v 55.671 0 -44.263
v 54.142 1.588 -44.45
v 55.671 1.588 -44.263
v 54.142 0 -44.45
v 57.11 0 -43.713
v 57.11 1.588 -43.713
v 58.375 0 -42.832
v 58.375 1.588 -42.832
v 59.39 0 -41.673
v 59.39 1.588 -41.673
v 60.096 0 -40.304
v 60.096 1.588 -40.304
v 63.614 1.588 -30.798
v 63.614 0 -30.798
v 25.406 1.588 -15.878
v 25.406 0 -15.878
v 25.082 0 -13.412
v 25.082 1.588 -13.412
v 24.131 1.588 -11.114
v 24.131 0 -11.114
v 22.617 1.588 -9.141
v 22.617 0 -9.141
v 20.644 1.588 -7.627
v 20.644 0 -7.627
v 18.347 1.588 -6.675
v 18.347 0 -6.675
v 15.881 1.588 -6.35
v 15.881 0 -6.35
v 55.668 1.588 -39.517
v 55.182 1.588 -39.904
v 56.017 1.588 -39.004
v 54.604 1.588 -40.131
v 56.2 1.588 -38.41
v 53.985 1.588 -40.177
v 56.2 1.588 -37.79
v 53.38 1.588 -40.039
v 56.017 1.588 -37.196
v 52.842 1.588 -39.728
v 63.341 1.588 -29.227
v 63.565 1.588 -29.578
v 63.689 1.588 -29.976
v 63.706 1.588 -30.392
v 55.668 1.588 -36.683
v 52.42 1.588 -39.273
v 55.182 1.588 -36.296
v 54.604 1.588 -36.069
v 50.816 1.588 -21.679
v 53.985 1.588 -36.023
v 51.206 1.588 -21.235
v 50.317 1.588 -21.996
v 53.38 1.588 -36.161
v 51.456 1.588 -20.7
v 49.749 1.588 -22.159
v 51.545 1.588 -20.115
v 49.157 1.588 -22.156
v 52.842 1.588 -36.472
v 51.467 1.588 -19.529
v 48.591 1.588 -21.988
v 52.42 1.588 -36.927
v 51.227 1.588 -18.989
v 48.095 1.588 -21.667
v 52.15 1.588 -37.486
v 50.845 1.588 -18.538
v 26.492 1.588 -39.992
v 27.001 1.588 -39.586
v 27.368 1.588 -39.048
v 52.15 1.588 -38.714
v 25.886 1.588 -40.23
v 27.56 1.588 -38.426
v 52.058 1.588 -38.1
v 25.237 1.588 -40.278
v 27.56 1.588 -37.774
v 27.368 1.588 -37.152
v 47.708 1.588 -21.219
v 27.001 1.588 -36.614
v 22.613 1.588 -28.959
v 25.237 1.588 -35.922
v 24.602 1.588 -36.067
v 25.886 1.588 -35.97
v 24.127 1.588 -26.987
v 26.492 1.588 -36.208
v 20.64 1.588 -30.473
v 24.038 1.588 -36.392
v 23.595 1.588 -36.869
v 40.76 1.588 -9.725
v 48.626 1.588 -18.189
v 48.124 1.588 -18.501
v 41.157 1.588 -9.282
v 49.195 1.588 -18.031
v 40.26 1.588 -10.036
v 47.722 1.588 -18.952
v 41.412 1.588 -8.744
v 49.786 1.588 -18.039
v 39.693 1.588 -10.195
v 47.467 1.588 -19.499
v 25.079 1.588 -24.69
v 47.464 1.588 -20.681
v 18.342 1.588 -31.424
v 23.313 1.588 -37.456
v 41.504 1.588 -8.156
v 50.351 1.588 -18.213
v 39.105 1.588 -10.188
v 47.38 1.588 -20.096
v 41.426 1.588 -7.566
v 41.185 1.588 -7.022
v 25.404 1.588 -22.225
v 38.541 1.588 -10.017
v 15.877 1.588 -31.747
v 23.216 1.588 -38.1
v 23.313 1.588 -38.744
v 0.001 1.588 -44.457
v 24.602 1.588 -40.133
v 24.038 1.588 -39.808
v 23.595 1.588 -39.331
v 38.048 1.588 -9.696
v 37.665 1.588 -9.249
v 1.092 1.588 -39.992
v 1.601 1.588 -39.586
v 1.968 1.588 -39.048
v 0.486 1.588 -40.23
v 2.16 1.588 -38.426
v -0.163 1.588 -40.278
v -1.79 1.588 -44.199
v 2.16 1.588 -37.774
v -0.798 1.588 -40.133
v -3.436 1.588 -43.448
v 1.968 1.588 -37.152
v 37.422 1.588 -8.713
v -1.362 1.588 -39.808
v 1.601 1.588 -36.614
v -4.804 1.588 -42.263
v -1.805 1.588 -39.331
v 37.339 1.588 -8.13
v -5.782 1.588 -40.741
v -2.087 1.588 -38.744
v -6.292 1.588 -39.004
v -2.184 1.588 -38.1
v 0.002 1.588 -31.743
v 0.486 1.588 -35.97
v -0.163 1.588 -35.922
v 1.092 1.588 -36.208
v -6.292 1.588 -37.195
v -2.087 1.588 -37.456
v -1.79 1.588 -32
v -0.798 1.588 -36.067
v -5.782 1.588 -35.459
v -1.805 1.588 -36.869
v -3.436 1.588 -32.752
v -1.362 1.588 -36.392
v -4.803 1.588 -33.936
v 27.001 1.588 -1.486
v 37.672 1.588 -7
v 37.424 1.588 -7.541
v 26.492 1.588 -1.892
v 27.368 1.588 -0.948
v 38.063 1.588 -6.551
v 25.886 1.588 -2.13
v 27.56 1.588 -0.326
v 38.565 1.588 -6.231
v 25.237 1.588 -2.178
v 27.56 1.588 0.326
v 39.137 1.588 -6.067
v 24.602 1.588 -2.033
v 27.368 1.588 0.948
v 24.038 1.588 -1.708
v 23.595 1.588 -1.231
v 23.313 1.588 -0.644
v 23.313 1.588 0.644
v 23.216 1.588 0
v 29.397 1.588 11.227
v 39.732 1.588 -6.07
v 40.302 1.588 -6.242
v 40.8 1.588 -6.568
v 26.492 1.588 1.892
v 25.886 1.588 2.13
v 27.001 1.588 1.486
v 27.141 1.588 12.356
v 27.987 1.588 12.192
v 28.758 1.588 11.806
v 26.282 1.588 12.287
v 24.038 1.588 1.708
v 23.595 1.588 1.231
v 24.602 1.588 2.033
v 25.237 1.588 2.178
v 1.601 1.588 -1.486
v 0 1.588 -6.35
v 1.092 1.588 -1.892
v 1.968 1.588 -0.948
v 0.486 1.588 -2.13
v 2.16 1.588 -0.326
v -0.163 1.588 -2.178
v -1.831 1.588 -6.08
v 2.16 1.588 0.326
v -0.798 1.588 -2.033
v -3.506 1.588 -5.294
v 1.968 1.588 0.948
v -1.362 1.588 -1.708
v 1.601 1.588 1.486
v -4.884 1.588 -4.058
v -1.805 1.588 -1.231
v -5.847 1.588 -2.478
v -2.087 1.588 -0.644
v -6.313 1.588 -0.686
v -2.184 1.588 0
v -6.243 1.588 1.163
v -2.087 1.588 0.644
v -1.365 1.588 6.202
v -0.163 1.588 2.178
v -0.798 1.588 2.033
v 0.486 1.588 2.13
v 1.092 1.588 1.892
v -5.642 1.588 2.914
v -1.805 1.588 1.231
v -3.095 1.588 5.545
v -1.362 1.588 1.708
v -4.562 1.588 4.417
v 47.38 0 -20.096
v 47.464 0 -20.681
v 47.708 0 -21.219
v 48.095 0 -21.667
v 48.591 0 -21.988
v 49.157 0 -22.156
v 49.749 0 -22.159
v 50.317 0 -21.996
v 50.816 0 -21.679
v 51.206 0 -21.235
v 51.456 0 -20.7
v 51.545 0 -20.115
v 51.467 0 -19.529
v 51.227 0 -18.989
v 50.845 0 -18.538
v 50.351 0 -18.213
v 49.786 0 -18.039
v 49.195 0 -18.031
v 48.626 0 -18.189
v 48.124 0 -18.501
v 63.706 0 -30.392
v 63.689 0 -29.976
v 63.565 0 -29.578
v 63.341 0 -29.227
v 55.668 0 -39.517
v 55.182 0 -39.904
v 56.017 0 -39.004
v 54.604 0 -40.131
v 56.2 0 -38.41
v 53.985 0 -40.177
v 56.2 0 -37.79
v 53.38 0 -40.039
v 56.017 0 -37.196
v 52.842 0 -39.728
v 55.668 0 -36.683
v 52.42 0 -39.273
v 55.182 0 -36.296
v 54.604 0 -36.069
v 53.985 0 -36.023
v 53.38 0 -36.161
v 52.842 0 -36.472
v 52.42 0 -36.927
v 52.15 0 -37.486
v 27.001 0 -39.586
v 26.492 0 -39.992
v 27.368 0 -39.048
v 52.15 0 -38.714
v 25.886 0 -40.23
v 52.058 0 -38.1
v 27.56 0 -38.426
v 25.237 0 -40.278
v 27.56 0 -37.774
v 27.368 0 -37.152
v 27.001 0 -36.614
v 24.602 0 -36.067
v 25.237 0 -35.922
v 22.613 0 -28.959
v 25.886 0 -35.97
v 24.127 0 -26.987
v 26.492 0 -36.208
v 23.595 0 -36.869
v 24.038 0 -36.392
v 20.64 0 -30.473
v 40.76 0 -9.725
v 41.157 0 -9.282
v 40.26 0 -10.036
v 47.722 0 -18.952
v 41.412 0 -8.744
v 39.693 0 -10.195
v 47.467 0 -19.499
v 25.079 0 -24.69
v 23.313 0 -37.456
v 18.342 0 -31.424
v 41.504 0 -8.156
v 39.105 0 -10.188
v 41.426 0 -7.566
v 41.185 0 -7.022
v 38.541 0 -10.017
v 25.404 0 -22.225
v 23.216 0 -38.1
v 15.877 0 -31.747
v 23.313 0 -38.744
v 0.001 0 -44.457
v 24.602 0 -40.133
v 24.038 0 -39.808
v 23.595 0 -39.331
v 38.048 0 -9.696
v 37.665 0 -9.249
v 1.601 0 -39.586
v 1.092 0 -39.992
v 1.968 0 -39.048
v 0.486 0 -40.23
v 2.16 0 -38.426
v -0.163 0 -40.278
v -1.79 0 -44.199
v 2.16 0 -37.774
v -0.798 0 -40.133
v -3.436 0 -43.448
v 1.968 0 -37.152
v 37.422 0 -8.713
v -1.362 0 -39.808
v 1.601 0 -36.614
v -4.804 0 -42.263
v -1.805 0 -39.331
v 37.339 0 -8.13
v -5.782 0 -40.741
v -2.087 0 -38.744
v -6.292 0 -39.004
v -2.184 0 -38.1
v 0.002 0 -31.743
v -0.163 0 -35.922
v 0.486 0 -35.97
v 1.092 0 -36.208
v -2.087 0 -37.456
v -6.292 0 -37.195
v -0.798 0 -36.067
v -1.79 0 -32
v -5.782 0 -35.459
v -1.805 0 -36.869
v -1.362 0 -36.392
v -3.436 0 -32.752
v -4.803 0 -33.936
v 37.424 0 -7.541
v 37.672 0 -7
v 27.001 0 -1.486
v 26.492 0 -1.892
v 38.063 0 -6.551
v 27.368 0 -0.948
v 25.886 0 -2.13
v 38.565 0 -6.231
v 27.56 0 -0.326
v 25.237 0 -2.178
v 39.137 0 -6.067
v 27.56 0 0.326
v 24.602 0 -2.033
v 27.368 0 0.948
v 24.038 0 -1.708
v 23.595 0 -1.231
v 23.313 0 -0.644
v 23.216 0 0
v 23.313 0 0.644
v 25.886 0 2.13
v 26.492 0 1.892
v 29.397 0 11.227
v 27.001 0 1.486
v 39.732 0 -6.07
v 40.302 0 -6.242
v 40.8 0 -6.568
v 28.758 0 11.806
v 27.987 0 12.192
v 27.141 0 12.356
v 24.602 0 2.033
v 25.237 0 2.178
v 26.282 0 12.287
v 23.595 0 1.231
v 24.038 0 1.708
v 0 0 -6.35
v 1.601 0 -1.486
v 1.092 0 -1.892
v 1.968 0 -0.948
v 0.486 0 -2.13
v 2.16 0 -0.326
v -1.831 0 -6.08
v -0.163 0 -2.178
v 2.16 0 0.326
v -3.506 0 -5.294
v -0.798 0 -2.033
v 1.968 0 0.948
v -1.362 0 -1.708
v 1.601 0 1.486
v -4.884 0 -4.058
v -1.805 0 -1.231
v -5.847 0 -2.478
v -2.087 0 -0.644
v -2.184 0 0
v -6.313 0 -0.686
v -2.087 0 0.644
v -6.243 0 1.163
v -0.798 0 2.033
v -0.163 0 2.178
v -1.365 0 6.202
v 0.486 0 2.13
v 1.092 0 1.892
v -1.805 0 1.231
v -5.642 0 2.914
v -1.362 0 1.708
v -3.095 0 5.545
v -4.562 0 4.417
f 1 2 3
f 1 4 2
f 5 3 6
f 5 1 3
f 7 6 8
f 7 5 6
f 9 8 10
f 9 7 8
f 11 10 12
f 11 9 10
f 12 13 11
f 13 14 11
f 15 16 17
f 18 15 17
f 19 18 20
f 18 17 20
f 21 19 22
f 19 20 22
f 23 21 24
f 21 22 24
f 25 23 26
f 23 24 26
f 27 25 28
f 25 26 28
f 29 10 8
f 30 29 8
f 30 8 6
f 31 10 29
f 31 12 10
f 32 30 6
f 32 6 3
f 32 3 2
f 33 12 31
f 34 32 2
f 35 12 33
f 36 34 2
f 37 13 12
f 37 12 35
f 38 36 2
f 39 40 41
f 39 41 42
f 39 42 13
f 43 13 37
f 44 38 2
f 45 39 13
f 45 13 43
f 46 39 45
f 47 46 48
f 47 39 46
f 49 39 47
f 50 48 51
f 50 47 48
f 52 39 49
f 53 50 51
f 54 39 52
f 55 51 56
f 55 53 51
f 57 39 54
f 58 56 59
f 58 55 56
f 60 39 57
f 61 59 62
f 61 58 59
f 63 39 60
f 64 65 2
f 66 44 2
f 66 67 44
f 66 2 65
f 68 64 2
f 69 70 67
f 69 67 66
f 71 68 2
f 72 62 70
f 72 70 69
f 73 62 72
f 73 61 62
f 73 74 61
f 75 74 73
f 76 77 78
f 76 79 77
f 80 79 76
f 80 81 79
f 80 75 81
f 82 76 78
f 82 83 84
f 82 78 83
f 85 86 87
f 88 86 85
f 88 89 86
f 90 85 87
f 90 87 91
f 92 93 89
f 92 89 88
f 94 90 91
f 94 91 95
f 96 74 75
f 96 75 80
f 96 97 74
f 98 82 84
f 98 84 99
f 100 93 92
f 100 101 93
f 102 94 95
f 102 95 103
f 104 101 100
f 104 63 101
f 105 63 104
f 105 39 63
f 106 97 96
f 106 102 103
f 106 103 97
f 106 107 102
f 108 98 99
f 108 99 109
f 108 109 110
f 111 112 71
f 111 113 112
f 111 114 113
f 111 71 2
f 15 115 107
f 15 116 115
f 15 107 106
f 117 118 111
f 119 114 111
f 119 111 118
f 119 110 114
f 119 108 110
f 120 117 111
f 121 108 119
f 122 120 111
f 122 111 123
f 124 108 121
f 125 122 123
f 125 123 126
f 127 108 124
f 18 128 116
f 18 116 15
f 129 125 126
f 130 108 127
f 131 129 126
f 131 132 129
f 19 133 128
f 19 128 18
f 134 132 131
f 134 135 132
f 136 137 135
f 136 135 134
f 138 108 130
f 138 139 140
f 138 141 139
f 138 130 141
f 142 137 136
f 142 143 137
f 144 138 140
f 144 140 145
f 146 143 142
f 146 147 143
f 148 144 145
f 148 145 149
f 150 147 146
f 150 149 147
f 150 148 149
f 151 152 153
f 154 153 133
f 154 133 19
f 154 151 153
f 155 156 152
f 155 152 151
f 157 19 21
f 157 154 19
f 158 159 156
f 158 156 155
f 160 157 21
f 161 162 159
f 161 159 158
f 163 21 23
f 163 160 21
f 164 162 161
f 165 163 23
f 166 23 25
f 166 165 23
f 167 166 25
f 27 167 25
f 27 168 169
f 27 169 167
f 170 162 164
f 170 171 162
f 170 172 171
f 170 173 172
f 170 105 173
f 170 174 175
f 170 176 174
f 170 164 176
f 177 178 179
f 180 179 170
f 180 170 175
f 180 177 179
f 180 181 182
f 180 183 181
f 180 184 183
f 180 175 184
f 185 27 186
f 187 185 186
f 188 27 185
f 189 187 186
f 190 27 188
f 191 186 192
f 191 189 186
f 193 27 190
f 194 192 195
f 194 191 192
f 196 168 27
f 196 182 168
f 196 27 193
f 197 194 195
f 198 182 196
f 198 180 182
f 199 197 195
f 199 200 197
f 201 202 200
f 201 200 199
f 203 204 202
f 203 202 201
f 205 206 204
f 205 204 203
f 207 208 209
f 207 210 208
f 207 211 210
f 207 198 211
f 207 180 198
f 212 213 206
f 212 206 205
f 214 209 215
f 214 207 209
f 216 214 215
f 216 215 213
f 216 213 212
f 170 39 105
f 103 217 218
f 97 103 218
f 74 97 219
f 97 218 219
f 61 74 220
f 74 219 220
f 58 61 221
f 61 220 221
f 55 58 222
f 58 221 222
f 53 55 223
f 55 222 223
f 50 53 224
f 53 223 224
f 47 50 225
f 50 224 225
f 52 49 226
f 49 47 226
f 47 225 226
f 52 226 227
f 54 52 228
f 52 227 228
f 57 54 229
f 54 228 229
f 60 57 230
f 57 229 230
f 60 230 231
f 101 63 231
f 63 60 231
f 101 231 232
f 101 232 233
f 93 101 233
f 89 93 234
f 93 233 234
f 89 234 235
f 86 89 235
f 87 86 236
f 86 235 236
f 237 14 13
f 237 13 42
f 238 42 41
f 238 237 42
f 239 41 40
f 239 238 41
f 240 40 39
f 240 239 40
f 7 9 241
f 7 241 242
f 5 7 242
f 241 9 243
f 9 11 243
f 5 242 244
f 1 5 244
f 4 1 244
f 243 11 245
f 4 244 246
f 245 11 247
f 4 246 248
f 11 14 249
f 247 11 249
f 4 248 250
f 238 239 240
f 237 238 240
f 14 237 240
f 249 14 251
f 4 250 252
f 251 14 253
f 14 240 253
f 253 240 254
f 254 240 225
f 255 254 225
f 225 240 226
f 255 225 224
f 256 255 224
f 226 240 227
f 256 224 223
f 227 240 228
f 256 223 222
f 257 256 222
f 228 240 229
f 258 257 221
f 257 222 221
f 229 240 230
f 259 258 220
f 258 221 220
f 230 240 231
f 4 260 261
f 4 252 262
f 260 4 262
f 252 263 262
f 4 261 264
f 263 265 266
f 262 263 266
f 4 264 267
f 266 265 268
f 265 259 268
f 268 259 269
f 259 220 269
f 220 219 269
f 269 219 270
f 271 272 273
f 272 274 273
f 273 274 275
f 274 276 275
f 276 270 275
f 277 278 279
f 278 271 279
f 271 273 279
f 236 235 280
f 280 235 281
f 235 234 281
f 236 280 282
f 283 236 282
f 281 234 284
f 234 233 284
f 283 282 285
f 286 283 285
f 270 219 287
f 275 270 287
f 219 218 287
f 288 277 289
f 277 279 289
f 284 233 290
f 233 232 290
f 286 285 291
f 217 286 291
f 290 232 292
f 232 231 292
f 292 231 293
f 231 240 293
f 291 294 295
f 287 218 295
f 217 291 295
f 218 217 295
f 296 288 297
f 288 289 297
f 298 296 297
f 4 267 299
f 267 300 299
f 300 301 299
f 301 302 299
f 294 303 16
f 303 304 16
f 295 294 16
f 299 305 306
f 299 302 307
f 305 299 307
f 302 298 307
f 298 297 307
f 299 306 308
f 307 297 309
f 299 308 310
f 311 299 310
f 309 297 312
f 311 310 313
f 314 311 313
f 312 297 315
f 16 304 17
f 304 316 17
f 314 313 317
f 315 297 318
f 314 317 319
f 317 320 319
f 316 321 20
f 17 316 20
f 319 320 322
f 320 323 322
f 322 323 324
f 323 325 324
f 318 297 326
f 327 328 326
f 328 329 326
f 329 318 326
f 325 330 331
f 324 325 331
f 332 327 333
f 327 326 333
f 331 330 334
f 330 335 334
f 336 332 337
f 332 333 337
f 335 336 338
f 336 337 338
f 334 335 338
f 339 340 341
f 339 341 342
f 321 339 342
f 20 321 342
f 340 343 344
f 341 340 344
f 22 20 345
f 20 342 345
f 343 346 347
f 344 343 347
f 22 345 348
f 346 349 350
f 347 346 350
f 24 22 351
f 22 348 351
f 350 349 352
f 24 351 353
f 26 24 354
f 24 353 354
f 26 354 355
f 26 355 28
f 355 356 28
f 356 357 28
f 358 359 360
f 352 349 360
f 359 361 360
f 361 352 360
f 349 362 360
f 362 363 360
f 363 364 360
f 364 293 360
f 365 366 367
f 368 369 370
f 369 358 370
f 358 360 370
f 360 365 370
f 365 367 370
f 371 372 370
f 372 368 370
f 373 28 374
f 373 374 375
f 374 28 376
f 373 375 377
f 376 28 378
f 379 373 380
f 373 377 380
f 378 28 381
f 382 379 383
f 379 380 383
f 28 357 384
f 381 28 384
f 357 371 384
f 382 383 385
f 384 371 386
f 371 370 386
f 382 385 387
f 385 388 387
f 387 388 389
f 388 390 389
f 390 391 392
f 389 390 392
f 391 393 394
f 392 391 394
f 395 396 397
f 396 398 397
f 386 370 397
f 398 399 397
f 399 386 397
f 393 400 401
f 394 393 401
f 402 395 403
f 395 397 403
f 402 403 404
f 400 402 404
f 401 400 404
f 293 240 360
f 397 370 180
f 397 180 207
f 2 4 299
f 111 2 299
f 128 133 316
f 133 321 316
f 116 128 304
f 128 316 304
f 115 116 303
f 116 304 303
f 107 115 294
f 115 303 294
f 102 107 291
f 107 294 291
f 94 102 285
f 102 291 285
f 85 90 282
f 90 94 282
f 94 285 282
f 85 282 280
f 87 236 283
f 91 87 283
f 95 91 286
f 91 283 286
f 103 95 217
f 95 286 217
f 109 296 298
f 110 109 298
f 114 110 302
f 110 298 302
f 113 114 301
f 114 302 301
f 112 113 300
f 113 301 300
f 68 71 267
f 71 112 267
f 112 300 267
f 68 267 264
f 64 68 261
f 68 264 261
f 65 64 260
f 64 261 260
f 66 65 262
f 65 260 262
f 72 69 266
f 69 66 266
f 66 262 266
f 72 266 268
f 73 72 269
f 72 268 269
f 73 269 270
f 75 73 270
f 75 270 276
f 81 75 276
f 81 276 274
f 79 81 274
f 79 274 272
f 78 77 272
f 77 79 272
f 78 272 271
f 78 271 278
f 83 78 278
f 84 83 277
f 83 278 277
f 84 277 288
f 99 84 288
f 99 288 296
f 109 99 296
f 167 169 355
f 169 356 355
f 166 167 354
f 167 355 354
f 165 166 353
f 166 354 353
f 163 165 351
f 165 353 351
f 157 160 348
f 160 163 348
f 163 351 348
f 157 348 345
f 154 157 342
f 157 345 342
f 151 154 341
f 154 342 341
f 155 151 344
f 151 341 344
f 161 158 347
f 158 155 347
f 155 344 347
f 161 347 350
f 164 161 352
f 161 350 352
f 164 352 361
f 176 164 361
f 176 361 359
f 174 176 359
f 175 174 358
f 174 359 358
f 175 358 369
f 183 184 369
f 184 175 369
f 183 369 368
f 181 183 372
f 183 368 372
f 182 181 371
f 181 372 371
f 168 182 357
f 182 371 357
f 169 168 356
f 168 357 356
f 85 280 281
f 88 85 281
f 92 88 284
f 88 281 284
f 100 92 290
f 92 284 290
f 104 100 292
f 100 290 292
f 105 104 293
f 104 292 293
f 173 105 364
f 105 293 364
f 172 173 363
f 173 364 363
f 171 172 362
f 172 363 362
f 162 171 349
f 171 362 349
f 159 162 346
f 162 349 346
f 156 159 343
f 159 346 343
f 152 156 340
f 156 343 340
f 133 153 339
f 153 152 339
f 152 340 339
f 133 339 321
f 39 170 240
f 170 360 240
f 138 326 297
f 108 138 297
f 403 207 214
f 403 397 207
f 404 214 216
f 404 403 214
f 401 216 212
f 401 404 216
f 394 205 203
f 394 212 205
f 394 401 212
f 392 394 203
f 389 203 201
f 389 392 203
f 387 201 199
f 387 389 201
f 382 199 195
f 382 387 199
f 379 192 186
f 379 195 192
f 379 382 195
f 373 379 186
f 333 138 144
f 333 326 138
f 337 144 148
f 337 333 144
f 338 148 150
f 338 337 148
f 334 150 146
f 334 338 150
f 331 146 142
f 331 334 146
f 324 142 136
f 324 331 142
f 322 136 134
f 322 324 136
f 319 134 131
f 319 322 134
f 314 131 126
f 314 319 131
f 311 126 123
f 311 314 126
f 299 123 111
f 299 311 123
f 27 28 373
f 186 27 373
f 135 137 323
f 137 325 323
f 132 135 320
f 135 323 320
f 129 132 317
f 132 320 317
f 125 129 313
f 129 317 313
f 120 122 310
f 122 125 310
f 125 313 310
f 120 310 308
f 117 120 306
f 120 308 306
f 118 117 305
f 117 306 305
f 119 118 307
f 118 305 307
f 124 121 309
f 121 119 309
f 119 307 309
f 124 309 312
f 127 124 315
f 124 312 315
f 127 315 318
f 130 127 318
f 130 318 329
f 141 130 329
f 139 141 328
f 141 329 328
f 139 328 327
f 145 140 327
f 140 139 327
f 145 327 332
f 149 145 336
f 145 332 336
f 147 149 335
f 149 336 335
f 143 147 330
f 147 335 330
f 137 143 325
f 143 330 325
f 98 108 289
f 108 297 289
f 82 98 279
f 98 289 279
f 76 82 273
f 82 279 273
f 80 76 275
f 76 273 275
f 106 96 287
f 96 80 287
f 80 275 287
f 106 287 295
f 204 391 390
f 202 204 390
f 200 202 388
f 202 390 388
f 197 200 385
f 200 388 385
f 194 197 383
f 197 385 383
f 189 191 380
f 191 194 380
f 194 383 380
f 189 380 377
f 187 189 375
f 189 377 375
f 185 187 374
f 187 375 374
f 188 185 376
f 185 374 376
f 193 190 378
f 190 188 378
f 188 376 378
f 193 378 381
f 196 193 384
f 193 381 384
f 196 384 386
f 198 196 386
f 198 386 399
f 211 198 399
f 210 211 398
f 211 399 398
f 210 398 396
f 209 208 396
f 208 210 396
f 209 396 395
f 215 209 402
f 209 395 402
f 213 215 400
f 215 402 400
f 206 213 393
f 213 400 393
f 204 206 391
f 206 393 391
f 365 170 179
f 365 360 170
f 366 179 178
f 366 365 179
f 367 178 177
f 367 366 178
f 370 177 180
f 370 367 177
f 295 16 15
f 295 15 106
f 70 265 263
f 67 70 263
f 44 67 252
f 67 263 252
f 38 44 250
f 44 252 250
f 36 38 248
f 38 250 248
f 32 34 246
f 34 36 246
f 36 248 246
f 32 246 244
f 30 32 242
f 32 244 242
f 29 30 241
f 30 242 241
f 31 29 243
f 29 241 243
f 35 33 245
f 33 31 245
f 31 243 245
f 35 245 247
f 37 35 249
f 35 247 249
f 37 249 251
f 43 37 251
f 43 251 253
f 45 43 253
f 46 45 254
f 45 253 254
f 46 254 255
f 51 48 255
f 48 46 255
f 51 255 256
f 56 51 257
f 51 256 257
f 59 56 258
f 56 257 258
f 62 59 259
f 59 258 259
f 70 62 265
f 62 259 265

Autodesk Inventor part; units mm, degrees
ref_plane "YZ Plane" through (0, 0, 0) normal (1, 0, 0) x (0, 1, 0)
ref_plane "XZ Plane" through (0, 0, 0) normal (0, 1, 0) x (-1, 0, 0)
ref_plane "XY Plane" through (0, 0, 0) normal (0, 0, 1) x (1, 0, 0)
sketch "main" plane through (0, 0, 0) normal (0, 0, 1) x (1, 0, 0)
  circle A0 centre (-18.8876, -3.9215) radius 2.0828
  arc A1 (-24.8429, -6.1253) -> (-18.8884, -10.2715) centre (-18.8876, -3.9215) ccw
  line L0 (5.8565, 45.4052) -> (-28.0879, 4.9518)
  circle A2 centre (9.8531, -3.9215) radius 2.1844
  line L1 (-18.8884, -10.2715) -> (35.2523, -10.2783)
  line L2 (9.8472, 18.301) -> (9.8489, 11.9535)
  arc A3 (9.8489, 11.9535) -> (19.3764, 2.4311) centre (19.3739, 11.9561) ccw
  circle A4 centre (9.8531, 34.1785) radius 2.1844
  line L3 (35.2514, 2.4354) -> (19.3764, 2.4311)
  arc A5 (35.2523, -10.2783) -> (35.2514, 2.4354) centre (35.2531, -3.9215) ccw
  circle A6 centre (35.2531, 34.1785) radius 2.1844
  arc A7 (35.2531, 27.8285) -> (36.6181, 40.3801) centre (35.2531, 34.1785) ccw
  circle A8 centre (35.2531, -3.9215) radius 2.1844
  line L4 (-28.3606, 3.3804) -> (-24.8429, -6.1253)
  line L5 (19.3722, 27.8285) -> (35.2531, 27.8285)
  arc A9 (19.3722, 27.8285) -> (9.8472, 18.301) centre (19.3722, 18.3035) ccw
  circle A10 centre (-14.2094, 14.0824) radius 2.0828
  arc A11 (-28.0879, 4.9518) -> (-28.3606, 3.3804) centre (-26.8718, 3.9314) ccw
  circle A12 centre (-4.1684, 26.0488) radius 2.0828
  line L6 (-4.1684, 26.0488) -> (-14.2094, 14.0824)
  line L7 (8.9712, 46.4651) -> (36.6181, 40.3801)
  arc A13 (8.9712, 46.4651) -> (5.8565, 45.4052) centre (8.2887, 43.3643) ccw
  point P0 (9.379, 13.4106)
  point P1 (9.8514, 2.4285)
  point P2 (9.8446, 27.8285)
  dimension "d0" = 4.1656
  dimension "d1" = 12.7
  dimension "d6" = 9.525
  dimension "d8" = 4.1656
  dimension "d9" = 1.5875
  dimension "d14" = 4.1656
  dimension "d15" = 15.621
  dimension "d17" = 3.175
sketch "Sketch1" plane through (0, 0, 0) normal (0, 1, 0) x (-1, 0, 0)
  circle A0 centre (-54.1407, -38.1) radius 2.0828
  arc A1 (-60.096, -40.3039) -> (-54.1415, -44.45) centre (-54.1407, -38.1) ccw
  line L0 (-29.3966, 11.2266) -> (-63.341, -29.2268)
  circle A2 centre (-25.4, -38.1) radius 2.1844
  line L1 (-54.1415, -44.45) -> (-0.0008, -44.4568)
  line L2 (-25.406, -15.8776) -> (-25.4043, -22.225)
  arc A3 (-25.4043, -22.225) -> (-15.8767, -31.7474) centre (-15.8793, -22.2224) ccw
  circle A4 centre (-25.4, 0) radius 2.1844
  line L3 (-0.0017, -31.7432) -> (-15.8767, -31.7474)
  arc A5 (-0.0008, -44.4568) -> (-0.0017, -31.7432) centre (0, -38.1) ccw
  circle A6 centre (0, 0) radius 2.1844
  arc A7 (0, -6.35) -> (1.3649, 6.2016) centre (0, 0) ccw
  circle A8 centre (0, -38.1) radius 2.1844
  line L4 (-63.6138, -30.7981) -> (-60.096, -40.3039)
  line L5 (-15.881, -6.35) -> (0, -6.35)
  arc A9 (-15.881, -6.35) -> (-25.406, -15.8776) centre (-15.881, -15.875) ccw
  circle A10 centre (-49.4625, -20.0961) radius 2.0828
  arc A11 (-63.341, -29.2268) -> (-63.6138, -30.7981) centre (-62.1249, -30.2472) ccw
  circle A12 centre (-39.4215, -8.1298) radius 2.0828
  line L6 (-39.4215, -8.1298) -> (-49.4625, -20.0961)
  line L7 (-26.2819, 12.2866) -> (1.3649, 6.2016)
  arc A13 (-26.2819, 12.2866) -> (-29.3966, 11.2266) centre (-26.9644, 9.1858) ccw
extrude "Extrusion1" add sketch "Sketch1" along normal blind 1.5875
properties part number "funel_gusset" material "Acetal Resin, White"
